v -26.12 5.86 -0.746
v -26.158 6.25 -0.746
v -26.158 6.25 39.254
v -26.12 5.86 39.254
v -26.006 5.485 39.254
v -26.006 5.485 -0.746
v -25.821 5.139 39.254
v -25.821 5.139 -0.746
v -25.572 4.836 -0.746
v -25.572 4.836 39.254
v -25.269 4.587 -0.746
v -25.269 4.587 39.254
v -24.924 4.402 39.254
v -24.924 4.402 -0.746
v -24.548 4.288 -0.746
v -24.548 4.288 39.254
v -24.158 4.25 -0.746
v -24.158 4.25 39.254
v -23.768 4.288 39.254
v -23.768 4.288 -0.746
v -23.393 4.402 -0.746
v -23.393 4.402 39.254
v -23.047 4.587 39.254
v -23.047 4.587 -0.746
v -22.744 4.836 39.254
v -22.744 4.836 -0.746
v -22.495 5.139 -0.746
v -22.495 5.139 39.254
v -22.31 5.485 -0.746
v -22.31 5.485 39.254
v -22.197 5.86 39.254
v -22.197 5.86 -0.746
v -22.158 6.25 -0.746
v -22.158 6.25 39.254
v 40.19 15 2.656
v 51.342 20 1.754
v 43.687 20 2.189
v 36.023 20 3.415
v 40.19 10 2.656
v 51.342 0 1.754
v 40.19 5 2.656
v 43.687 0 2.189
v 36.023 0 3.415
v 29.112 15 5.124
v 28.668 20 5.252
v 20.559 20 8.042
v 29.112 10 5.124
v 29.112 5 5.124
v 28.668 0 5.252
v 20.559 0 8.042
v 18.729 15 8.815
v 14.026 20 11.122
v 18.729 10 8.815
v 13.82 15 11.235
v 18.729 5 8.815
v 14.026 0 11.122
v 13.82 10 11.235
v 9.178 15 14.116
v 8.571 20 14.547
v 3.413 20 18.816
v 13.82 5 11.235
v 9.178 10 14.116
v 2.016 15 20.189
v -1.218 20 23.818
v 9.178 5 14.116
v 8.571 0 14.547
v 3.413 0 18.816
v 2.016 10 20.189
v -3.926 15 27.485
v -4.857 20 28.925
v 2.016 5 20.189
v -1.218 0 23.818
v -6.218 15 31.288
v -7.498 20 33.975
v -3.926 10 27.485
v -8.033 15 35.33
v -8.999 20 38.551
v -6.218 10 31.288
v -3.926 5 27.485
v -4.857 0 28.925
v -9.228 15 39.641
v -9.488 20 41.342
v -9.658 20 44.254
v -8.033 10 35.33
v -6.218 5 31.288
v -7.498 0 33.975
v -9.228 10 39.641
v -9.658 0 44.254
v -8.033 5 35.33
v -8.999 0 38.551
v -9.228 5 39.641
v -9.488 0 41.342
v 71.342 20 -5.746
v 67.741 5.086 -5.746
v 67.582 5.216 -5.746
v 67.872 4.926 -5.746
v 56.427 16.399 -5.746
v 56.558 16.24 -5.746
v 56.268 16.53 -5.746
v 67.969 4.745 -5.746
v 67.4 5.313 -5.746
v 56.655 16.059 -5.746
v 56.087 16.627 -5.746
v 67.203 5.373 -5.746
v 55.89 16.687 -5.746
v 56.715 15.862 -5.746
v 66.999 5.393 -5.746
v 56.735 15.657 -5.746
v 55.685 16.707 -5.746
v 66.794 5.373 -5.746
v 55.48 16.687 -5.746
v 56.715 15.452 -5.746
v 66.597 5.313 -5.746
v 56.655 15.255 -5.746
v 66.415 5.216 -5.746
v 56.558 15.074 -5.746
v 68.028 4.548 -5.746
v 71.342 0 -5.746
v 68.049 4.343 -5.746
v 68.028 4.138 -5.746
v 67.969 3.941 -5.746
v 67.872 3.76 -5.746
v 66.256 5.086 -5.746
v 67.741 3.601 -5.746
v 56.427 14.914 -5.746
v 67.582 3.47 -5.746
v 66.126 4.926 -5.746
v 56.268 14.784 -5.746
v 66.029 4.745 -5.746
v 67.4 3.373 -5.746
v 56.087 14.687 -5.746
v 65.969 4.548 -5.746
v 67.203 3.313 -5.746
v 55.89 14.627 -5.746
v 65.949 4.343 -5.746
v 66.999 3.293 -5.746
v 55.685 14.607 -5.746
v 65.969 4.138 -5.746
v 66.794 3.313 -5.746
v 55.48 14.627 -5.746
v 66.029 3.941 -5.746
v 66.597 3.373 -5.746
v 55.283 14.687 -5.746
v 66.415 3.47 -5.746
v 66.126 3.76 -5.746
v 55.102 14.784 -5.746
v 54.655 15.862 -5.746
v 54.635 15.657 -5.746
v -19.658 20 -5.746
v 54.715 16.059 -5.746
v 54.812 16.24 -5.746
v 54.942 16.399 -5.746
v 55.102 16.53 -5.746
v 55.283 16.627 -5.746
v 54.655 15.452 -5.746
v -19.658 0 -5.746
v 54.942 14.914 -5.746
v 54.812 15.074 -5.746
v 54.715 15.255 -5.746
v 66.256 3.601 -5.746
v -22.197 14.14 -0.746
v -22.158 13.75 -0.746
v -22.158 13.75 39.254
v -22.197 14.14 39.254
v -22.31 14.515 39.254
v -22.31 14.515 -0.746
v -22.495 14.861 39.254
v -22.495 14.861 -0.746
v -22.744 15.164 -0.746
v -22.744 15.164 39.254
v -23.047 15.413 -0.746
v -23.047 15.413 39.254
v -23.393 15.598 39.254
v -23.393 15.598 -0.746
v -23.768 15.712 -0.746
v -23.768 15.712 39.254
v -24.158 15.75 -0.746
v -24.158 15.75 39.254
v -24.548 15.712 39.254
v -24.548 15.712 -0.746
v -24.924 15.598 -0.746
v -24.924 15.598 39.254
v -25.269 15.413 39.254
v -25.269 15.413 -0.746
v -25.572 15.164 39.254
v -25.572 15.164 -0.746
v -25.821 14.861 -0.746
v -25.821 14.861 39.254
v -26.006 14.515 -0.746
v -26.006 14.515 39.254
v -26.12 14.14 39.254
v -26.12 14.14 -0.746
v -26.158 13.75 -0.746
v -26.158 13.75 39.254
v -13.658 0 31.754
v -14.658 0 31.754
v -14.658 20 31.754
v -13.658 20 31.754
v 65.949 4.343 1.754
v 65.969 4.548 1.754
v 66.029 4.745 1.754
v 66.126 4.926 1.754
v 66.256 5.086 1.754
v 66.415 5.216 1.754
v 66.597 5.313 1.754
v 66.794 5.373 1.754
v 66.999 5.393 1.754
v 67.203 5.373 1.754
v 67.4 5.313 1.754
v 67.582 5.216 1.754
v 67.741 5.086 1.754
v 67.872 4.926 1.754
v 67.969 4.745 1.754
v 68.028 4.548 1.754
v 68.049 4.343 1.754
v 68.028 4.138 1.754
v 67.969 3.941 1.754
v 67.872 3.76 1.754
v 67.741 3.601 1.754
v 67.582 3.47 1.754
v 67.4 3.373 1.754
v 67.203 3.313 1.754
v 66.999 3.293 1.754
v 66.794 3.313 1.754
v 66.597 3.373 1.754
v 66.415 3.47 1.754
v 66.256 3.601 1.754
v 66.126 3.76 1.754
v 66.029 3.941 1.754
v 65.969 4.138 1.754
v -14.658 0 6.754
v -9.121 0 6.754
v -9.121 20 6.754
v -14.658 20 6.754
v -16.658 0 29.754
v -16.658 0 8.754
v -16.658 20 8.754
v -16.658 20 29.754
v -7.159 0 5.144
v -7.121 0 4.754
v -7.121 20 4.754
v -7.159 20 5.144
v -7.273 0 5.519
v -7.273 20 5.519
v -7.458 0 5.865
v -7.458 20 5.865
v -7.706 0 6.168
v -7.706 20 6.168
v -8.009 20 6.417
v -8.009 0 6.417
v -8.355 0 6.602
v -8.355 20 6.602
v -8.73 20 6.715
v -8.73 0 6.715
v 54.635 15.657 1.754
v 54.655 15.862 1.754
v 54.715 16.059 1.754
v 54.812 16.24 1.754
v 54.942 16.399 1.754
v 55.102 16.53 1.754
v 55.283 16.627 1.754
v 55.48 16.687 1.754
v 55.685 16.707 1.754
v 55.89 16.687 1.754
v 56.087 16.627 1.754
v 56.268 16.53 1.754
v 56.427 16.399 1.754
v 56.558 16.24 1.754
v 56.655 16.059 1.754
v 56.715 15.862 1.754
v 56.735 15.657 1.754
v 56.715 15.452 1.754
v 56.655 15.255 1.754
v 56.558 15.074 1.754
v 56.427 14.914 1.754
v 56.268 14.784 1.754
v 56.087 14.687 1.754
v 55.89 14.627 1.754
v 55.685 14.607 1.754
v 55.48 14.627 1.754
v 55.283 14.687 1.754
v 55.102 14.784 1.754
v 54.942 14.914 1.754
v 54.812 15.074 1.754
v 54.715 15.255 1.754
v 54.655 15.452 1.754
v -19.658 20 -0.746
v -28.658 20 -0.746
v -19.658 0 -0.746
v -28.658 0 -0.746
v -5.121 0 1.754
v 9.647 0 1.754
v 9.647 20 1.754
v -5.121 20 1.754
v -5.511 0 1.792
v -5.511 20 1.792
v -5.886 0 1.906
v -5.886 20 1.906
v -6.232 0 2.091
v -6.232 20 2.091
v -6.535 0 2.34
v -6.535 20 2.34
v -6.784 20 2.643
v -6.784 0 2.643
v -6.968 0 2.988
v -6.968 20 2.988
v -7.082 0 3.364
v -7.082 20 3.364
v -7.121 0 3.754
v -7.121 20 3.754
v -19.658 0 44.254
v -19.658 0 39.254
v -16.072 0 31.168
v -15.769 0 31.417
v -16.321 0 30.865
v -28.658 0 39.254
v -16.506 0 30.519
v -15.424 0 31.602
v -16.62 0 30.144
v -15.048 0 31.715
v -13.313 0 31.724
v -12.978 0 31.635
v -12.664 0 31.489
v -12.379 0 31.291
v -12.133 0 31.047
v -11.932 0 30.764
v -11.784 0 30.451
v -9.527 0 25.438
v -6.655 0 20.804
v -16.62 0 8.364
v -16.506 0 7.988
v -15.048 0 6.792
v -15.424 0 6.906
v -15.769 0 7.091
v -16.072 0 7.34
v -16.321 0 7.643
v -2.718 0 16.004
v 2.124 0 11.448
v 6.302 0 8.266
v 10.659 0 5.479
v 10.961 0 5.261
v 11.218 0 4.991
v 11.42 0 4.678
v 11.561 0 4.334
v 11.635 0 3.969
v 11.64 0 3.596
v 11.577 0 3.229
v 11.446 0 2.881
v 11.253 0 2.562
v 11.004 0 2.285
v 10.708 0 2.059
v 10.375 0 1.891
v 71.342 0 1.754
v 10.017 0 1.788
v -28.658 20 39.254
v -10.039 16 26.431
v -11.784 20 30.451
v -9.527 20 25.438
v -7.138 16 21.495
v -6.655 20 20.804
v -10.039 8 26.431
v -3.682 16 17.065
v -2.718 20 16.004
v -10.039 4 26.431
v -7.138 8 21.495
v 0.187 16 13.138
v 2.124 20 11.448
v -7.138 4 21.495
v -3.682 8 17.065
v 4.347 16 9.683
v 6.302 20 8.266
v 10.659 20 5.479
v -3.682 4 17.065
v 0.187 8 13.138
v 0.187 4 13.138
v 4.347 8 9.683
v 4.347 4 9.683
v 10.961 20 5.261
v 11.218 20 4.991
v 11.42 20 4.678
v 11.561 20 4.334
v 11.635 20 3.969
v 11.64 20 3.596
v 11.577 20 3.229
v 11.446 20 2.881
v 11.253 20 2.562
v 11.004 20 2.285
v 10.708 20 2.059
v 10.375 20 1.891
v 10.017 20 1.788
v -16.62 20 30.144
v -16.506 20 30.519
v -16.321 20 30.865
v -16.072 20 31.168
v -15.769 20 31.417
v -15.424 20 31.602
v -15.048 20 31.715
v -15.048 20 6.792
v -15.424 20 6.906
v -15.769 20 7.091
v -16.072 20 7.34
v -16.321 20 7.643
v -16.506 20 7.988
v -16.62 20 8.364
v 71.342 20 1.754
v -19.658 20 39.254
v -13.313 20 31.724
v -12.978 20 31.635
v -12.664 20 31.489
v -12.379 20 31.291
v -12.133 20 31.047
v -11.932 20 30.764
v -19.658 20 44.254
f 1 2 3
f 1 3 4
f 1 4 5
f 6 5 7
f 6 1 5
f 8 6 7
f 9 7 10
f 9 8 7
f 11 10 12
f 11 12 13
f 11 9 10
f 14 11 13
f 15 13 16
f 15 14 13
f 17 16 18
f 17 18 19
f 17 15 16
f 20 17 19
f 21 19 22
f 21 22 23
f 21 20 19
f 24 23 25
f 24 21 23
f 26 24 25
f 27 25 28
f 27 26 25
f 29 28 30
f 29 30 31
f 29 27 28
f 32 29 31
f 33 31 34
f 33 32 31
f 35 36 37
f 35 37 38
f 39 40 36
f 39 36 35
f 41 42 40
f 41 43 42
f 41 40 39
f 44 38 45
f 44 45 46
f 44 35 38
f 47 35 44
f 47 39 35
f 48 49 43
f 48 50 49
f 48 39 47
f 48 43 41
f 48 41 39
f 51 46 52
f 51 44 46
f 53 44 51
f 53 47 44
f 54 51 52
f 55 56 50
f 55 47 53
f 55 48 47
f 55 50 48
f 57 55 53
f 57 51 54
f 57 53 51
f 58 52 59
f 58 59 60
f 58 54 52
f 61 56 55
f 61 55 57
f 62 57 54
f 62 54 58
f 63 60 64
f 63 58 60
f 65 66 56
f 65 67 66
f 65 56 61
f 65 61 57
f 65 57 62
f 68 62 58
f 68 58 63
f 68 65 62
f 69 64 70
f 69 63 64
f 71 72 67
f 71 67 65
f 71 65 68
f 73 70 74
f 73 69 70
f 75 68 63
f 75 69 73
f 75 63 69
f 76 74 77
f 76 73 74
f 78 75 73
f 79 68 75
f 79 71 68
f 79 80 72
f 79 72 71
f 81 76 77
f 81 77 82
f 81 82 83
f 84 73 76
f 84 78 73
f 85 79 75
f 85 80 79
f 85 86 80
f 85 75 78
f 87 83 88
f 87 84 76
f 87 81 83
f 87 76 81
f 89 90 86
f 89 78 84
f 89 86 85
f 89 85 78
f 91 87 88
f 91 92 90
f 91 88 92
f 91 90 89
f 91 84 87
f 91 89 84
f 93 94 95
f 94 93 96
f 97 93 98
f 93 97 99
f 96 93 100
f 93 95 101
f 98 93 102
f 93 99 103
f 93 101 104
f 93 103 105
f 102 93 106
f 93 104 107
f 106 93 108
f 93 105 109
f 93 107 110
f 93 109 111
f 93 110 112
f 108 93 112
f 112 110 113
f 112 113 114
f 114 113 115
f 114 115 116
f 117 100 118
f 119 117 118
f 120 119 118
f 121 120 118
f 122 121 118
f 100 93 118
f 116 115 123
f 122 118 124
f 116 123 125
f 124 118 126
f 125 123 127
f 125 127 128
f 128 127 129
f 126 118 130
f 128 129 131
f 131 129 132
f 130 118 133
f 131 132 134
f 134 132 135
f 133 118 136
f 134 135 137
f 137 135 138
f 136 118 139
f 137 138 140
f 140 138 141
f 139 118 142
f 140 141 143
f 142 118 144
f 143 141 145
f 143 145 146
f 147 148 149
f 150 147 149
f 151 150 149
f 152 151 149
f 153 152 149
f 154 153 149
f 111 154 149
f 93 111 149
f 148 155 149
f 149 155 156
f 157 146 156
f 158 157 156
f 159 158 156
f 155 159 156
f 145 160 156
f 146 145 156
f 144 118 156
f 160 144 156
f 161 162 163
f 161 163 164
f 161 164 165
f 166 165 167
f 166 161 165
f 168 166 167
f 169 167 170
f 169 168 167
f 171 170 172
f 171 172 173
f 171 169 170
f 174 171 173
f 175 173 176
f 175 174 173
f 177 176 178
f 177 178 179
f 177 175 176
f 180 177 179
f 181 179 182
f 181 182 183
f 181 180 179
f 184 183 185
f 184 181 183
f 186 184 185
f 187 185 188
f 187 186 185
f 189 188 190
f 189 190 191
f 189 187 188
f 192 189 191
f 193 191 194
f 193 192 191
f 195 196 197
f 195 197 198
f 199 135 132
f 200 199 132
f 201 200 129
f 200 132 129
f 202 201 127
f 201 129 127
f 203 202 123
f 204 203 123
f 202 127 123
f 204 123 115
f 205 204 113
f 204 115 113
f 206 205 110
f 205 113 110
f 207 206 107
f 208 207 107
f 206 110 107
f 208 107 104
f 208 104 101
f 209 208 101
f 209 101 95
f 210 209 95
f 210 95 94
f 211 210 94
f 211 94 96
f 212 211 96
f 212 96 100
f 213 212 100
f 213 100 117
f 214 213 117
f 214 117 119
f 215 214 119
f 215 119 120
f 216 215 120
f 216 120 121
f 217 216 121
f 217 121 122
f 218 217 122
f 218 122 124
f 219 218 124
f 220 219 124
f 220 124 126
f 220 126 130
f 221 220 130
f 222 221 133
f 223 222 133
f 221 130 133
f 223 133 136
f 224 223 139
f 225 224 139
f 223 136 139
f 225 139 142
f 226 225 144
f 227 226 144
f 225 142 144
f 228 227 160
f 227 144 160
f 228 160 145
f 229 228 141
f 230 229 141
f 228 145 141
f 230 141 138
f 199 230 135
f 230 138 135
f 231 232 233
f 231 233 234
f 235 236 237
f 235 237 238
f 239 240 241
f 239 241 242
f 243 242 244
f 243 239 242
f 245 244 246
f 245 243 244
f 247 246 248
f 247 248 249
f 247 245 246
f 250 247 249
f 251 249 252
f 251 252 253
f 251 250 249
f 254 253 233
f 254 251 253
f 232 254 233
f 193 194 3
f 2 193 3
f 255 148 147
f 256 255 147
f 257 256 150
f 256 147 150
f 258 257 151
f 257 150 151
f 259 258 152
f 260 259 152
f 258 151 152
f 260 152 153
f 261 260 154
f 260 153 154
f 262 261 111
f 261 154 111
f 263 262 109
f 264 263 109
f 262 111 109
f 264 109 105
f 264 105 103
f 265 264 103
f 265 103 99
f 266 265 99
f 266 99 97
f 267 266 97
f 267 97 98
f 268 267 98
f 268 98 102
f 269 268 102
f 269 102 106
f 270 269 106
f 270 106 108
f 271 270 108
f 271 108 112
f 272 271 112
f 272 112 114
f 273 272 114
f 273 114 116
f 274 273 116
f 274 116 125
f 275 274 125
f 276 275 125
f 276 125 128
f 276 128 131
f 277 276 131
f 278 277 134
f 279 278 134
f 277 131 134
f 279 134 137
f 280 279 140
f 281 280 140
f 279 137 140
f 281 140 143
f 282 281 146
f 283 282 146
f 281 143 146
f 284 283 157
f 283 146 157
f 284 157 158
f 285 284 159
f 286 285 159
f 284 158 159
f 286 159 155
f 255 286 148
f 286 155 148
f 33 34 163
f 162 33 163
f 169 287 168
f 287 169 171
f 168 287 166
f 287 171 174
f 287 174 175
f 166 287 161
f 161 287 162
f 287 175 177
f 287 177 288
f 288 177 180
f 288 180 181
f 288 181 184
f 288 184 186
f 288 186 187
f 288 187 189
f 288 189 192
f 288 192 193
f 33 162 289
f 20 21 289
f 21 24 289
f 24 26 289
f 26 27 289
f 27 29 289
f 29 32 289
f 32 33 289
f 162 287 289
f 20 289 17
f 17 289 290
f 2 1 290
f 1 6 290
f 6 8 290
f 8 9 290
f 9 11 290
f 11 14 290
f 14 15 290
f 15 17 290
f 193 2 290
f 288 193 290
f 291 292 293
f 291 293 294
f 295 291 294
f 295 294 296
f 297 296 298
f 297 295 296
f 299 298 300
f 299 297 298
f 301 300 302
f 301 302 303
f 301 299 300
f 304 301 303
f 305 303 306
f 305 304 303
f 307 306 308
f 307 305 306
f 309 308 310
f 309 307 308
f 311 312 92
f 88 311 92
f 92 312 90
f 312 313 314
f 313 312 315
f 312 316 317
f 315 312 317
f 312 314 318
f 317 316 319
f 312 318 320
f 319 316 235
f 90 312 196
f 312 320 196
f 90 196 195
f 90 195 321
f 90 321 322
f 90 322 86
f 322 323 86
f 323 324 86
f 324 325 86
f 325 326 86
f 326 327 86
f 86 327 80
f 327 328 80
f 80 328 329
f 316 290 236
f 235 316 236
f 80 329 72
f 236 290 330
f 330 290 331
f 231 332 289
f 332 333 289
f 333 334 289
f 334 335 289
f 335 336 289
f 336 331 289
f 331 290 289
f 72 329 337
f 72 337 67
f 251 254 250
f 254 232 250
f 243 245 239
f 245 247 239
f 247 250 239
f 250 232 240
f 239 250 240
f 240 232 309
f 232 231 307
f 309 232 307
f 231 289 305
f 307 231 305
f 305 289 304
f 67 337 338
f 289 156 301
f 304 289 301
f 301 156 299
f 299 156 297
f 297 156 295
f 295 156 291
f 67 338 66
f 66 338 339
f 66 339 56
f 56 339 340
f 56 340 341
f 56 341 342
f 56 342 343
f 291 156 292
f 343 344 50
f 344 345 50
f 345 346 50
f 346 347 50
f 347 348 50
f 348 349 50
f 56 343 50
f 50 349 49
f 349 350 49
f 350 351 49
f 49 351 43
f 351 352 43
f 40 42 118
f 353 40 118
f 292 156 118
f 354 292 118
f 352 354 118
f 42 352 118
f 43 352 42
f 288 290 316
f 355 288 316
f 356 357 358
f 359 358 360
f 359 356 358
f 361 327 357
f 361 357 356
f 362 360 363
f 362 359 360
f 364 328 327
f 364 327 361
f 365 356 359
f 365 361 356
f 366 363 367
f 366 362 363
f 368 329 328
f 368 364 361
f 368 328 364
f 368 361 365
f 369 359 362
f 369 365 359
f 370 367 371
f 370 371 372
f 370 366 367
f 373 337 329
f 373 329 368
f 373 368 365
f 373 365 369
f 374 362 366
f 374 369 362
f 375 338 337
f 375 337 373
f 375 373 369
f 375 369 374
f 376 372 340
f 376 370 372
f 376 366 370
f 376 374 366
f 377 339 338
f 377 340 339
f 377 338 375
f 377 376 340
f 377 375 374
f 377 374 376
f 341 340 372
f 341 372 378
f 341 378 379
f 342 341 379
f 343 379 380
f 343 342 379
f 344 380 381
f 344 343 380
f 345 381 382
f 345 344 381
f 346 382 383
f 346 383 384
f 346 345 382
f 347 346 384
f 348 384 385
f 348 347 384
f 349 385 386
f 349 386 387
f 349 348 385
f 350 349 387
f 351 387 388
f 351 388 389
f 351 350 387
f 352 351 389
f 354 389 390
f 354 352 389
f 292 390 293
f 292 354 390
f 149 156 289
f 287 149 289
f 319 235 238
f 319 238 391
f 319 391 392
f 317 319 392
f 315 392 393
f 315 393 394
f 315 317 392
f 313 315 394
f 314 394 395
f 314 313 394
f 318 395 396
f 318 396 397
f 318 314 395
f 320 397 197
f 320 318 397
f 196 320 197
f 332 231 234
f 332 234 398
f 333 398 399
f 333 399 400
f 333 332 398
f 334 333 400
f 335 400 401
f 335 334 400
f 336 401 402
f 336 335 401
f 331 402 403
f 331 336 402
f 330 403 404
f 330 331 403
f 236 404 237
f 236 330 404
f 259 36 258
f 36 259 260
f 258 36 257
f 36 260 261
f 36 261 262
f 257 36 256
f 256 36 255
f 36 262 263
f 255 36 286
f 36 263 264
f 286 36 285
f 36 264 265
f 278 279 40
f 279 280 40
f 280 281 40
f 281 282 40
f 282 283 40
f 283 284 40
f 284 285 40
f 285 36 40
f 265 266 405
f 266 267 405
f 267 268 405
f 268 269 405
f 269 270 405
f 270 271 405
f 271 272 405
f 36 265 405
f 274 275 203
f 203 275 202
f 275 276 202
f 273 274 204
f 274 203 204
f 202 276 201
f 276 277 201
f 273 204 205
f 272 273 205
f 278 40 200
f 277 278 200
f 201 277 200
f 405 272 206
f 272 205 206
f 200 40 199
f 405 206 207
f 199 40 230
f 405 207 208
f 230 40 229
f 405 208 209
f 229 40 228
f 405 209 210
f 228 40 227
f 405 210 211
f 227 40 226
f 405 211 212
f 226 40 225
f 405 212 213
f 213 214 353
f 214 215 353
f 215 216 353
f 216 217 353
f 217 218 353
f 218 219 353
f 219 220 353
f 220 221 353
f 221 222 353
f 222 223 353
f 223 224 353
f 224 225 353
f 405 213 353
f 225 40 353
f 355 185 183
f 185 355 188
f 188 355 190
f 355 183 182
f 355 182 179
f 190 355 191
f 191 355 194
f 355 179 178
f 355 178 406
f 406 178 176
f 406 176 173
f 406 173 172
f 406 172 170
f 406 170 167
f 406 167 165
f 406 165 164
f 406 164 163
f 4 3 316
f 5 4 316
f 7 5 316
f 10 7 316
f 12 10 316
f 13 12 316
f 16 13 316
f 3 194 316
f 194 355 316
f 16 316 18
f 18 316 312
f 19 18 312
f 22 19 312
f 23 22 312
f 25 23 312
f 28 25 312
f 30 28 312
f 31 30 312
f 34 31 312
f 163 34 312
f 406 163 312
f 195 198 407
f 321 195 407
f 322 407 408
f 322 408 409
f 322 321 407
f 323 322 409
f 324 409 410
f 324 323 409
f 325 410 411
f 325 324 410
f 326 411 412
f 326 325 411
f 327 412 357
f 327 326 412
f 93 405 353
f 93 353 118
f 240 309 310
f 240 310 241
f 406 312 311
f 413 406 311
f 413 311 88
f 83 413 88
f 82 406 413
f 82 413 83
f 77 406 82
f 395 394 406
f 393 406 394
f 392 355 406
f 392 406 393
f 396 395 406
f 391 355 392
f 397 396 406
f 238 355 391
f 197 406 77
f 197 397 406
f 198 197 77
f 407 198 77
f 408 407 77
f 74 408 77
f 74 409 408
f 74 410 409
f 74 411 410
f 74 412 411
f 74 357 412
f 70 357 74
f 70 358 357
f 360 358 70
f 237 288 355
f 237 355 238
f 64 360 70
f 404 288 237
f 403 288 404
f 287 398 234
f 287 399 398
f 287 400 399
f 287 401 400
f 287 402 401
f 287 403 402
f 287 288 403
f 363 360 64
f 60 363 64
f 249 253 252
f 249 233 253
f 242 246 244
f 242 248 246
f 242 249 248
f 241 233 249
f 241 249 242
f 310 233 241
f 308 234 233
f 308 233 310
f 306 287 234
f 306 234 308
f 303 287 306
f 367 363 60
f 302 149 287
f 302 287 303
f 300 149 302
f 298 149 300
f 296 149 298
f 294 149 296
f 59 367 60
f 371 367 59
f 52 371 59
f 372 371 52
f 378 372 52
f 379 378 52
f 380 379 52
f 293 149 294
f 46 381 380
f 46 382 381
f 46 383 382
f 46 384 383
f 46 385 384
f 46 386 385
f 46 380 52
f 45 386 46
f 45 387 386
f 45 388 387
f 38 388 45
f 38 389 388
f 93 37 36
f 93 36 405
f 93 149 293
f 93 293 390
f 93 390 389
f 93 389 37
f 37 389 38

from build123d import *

# Parameters (mm, degrees)
BOSS_EXTRUDE1_DEPTH = 20
SKETCH3_R           = 1.05
CUT_EXTRUDE1_DEPTH  = 20
CUT_EXTRUDE2_DEPTH  = 40


with BuildPart() as part:
    # Sketch2 → Boss-Extrude1 (new body)
    with BuildSketch(Plane(origin=(0, 0, 0), x_dir=(1, 0, 0), z_dir=(0, 1, 0))):
        with BuildLine():
            Line((-28.658256337, 0.746179815), (-28.658256337, -39.253820185))
            Line((-28.658256337, -39.253820185), (-19.658256337, -39.253820185))
            Line((-19.658256337, -39.253820185), (-19.658256337, -44.253820185))
            Line((-19.658256337, -44.253820185), (-9.658256337, -44.253820185))
            add(Edge.make_bspline(
                [(51.341743663, -1.753820185), (43.95022076, -1.753820185), (29.066773176, -4.285907938), (9.29440035, -12.327662678), (-4.675837532, -26.625913431), (-9.658256337, -37.88850288), (-9.658256337, -44.253820185)],
                knots=[0, 0, 0, 0, 0.278287614, 0.548949831, 0.780652353, 1, 1, 1, 1], degree=3))
            Line((51.341743663, -1.753820185), (71.341743663, -1.753820185))
            Line((71.341743663, -1.753820185), (71.341743663, 5.746179815))
            Line((71.341743663, 5.746179815), (-19.658256337, 5.746179815))
            Line((-19.658256337, 5.746179815), (-19.658256337, 0.746179815))
            Line((-19.658256337, 0.746179815), (-28.658256337, 0.746179815))
        make_face()
        with BuildLine():
            Line((-16.658256337, -8.753820185), (-16.658256337, -29.753820185))
            ThreePointArc((-16.658256337, -29.753820185), (-16.072469899, -31.168033747), (-14.658256337, -31.753820185))
            Line((-14.658256337, -31.753820185), (-13.658256337, -31.753820185))
            ThreePointArc((-13.658256337, -31.753820185), (-12.516927691, -31.396187051), (-11.783775986, -30.451189107))
            add(Edge.make_bspline(
                [(-11.783775986, -30.451189107), (-11.274185157, -29.081443531), (-9.924306316, -25.969887858), (-6.252653639, -19.752734333), (0.001148732, -12.823138849), (6.367068894, -8.07935758), (10.008653919, -5.860320829), (10.658890446, -5.478714099)],
                knots=[0.457049826, 0.457049826, 0.457049826, 0.457049826, 0.498595934, 0.553238181, 0.662522676, 0.771807171, 0.79534653, 0.79534653, 0.79534653, 0.79534653], degree=3))
            ThreePointArc((10.658890446, -5.478714099), (11.576593959, -3.229314622), (9.646595536, -1.753820185))
            Line((9.646595536, -1.753820185), (-5.120566965, -1.753820185))
            ThreePointArc((-5.120566965, -1.753820185), (-6.534780528, -2.339606623), (-7.120566965, -3.753820185))
            Line((-7.120566965, -3.753820185), (-7.120566965, -4.753820185))
            ThreePointArc((-7.120566965, -4.753820185), (-7.706353403, -6.168033747), (-9.120566965, -6.753820185))
            Line((-9.120566965, -6.753820185), (-14.658256337, -6.753820185))
            ThreePointArc((-14.658256337, -6.753820185), (-16.072469899, -7.339606623), (-16.658256337, -8.753820185))
        make_face(mode=Mode.SUBTRACT)
    extrude(amount=BOSS_EXTRUDE1_DEPTH)

    # Sketch3 → Cut-Extrude1 (cut)
    with BuildSketch(Plane(origin=(0, 0, -5.746179815), x_dir=(-1, 0, 0), z_dir=(0, 0, -1))):
        with Locations((-55.684889413, 15.656854249)):
            Circle(SKETCH3_R)
        with Locations((-66.998597912, 4.343145751)):
            Circle(SKETCH3_R)
    extrude(amount=-CUT_EXTRUDE1_DEPTH, mode=Mode.SUBTRACT)

    # Sketch4 → Cut-Extrude2 (cut)
    with BuildSketch(Plane(origin=(0, 0, -0.746179815), x_dir=(-1, 0, 0), z_dir=(0, 0, -1))):
        with BuildLine():
            Line((22.158256337, 6.25), (22.158256337, 13.75))
            ThreePointArc((22.158256337, 13.75), (24.158256337, 15.75), (26.158256337, 13.75))
            Line((26.158256337, 13.75), (26.158256337, 6.25))
            ThreePointArc((26.158256337, 6.25), (24.158256337, 4.25), (22.158256337, 6.25))
        make_face()
    extrude(amount=-CUT_EXTRUDE2_DEPTH, mode=Mode.SUBTRACT)


solid = part.part
